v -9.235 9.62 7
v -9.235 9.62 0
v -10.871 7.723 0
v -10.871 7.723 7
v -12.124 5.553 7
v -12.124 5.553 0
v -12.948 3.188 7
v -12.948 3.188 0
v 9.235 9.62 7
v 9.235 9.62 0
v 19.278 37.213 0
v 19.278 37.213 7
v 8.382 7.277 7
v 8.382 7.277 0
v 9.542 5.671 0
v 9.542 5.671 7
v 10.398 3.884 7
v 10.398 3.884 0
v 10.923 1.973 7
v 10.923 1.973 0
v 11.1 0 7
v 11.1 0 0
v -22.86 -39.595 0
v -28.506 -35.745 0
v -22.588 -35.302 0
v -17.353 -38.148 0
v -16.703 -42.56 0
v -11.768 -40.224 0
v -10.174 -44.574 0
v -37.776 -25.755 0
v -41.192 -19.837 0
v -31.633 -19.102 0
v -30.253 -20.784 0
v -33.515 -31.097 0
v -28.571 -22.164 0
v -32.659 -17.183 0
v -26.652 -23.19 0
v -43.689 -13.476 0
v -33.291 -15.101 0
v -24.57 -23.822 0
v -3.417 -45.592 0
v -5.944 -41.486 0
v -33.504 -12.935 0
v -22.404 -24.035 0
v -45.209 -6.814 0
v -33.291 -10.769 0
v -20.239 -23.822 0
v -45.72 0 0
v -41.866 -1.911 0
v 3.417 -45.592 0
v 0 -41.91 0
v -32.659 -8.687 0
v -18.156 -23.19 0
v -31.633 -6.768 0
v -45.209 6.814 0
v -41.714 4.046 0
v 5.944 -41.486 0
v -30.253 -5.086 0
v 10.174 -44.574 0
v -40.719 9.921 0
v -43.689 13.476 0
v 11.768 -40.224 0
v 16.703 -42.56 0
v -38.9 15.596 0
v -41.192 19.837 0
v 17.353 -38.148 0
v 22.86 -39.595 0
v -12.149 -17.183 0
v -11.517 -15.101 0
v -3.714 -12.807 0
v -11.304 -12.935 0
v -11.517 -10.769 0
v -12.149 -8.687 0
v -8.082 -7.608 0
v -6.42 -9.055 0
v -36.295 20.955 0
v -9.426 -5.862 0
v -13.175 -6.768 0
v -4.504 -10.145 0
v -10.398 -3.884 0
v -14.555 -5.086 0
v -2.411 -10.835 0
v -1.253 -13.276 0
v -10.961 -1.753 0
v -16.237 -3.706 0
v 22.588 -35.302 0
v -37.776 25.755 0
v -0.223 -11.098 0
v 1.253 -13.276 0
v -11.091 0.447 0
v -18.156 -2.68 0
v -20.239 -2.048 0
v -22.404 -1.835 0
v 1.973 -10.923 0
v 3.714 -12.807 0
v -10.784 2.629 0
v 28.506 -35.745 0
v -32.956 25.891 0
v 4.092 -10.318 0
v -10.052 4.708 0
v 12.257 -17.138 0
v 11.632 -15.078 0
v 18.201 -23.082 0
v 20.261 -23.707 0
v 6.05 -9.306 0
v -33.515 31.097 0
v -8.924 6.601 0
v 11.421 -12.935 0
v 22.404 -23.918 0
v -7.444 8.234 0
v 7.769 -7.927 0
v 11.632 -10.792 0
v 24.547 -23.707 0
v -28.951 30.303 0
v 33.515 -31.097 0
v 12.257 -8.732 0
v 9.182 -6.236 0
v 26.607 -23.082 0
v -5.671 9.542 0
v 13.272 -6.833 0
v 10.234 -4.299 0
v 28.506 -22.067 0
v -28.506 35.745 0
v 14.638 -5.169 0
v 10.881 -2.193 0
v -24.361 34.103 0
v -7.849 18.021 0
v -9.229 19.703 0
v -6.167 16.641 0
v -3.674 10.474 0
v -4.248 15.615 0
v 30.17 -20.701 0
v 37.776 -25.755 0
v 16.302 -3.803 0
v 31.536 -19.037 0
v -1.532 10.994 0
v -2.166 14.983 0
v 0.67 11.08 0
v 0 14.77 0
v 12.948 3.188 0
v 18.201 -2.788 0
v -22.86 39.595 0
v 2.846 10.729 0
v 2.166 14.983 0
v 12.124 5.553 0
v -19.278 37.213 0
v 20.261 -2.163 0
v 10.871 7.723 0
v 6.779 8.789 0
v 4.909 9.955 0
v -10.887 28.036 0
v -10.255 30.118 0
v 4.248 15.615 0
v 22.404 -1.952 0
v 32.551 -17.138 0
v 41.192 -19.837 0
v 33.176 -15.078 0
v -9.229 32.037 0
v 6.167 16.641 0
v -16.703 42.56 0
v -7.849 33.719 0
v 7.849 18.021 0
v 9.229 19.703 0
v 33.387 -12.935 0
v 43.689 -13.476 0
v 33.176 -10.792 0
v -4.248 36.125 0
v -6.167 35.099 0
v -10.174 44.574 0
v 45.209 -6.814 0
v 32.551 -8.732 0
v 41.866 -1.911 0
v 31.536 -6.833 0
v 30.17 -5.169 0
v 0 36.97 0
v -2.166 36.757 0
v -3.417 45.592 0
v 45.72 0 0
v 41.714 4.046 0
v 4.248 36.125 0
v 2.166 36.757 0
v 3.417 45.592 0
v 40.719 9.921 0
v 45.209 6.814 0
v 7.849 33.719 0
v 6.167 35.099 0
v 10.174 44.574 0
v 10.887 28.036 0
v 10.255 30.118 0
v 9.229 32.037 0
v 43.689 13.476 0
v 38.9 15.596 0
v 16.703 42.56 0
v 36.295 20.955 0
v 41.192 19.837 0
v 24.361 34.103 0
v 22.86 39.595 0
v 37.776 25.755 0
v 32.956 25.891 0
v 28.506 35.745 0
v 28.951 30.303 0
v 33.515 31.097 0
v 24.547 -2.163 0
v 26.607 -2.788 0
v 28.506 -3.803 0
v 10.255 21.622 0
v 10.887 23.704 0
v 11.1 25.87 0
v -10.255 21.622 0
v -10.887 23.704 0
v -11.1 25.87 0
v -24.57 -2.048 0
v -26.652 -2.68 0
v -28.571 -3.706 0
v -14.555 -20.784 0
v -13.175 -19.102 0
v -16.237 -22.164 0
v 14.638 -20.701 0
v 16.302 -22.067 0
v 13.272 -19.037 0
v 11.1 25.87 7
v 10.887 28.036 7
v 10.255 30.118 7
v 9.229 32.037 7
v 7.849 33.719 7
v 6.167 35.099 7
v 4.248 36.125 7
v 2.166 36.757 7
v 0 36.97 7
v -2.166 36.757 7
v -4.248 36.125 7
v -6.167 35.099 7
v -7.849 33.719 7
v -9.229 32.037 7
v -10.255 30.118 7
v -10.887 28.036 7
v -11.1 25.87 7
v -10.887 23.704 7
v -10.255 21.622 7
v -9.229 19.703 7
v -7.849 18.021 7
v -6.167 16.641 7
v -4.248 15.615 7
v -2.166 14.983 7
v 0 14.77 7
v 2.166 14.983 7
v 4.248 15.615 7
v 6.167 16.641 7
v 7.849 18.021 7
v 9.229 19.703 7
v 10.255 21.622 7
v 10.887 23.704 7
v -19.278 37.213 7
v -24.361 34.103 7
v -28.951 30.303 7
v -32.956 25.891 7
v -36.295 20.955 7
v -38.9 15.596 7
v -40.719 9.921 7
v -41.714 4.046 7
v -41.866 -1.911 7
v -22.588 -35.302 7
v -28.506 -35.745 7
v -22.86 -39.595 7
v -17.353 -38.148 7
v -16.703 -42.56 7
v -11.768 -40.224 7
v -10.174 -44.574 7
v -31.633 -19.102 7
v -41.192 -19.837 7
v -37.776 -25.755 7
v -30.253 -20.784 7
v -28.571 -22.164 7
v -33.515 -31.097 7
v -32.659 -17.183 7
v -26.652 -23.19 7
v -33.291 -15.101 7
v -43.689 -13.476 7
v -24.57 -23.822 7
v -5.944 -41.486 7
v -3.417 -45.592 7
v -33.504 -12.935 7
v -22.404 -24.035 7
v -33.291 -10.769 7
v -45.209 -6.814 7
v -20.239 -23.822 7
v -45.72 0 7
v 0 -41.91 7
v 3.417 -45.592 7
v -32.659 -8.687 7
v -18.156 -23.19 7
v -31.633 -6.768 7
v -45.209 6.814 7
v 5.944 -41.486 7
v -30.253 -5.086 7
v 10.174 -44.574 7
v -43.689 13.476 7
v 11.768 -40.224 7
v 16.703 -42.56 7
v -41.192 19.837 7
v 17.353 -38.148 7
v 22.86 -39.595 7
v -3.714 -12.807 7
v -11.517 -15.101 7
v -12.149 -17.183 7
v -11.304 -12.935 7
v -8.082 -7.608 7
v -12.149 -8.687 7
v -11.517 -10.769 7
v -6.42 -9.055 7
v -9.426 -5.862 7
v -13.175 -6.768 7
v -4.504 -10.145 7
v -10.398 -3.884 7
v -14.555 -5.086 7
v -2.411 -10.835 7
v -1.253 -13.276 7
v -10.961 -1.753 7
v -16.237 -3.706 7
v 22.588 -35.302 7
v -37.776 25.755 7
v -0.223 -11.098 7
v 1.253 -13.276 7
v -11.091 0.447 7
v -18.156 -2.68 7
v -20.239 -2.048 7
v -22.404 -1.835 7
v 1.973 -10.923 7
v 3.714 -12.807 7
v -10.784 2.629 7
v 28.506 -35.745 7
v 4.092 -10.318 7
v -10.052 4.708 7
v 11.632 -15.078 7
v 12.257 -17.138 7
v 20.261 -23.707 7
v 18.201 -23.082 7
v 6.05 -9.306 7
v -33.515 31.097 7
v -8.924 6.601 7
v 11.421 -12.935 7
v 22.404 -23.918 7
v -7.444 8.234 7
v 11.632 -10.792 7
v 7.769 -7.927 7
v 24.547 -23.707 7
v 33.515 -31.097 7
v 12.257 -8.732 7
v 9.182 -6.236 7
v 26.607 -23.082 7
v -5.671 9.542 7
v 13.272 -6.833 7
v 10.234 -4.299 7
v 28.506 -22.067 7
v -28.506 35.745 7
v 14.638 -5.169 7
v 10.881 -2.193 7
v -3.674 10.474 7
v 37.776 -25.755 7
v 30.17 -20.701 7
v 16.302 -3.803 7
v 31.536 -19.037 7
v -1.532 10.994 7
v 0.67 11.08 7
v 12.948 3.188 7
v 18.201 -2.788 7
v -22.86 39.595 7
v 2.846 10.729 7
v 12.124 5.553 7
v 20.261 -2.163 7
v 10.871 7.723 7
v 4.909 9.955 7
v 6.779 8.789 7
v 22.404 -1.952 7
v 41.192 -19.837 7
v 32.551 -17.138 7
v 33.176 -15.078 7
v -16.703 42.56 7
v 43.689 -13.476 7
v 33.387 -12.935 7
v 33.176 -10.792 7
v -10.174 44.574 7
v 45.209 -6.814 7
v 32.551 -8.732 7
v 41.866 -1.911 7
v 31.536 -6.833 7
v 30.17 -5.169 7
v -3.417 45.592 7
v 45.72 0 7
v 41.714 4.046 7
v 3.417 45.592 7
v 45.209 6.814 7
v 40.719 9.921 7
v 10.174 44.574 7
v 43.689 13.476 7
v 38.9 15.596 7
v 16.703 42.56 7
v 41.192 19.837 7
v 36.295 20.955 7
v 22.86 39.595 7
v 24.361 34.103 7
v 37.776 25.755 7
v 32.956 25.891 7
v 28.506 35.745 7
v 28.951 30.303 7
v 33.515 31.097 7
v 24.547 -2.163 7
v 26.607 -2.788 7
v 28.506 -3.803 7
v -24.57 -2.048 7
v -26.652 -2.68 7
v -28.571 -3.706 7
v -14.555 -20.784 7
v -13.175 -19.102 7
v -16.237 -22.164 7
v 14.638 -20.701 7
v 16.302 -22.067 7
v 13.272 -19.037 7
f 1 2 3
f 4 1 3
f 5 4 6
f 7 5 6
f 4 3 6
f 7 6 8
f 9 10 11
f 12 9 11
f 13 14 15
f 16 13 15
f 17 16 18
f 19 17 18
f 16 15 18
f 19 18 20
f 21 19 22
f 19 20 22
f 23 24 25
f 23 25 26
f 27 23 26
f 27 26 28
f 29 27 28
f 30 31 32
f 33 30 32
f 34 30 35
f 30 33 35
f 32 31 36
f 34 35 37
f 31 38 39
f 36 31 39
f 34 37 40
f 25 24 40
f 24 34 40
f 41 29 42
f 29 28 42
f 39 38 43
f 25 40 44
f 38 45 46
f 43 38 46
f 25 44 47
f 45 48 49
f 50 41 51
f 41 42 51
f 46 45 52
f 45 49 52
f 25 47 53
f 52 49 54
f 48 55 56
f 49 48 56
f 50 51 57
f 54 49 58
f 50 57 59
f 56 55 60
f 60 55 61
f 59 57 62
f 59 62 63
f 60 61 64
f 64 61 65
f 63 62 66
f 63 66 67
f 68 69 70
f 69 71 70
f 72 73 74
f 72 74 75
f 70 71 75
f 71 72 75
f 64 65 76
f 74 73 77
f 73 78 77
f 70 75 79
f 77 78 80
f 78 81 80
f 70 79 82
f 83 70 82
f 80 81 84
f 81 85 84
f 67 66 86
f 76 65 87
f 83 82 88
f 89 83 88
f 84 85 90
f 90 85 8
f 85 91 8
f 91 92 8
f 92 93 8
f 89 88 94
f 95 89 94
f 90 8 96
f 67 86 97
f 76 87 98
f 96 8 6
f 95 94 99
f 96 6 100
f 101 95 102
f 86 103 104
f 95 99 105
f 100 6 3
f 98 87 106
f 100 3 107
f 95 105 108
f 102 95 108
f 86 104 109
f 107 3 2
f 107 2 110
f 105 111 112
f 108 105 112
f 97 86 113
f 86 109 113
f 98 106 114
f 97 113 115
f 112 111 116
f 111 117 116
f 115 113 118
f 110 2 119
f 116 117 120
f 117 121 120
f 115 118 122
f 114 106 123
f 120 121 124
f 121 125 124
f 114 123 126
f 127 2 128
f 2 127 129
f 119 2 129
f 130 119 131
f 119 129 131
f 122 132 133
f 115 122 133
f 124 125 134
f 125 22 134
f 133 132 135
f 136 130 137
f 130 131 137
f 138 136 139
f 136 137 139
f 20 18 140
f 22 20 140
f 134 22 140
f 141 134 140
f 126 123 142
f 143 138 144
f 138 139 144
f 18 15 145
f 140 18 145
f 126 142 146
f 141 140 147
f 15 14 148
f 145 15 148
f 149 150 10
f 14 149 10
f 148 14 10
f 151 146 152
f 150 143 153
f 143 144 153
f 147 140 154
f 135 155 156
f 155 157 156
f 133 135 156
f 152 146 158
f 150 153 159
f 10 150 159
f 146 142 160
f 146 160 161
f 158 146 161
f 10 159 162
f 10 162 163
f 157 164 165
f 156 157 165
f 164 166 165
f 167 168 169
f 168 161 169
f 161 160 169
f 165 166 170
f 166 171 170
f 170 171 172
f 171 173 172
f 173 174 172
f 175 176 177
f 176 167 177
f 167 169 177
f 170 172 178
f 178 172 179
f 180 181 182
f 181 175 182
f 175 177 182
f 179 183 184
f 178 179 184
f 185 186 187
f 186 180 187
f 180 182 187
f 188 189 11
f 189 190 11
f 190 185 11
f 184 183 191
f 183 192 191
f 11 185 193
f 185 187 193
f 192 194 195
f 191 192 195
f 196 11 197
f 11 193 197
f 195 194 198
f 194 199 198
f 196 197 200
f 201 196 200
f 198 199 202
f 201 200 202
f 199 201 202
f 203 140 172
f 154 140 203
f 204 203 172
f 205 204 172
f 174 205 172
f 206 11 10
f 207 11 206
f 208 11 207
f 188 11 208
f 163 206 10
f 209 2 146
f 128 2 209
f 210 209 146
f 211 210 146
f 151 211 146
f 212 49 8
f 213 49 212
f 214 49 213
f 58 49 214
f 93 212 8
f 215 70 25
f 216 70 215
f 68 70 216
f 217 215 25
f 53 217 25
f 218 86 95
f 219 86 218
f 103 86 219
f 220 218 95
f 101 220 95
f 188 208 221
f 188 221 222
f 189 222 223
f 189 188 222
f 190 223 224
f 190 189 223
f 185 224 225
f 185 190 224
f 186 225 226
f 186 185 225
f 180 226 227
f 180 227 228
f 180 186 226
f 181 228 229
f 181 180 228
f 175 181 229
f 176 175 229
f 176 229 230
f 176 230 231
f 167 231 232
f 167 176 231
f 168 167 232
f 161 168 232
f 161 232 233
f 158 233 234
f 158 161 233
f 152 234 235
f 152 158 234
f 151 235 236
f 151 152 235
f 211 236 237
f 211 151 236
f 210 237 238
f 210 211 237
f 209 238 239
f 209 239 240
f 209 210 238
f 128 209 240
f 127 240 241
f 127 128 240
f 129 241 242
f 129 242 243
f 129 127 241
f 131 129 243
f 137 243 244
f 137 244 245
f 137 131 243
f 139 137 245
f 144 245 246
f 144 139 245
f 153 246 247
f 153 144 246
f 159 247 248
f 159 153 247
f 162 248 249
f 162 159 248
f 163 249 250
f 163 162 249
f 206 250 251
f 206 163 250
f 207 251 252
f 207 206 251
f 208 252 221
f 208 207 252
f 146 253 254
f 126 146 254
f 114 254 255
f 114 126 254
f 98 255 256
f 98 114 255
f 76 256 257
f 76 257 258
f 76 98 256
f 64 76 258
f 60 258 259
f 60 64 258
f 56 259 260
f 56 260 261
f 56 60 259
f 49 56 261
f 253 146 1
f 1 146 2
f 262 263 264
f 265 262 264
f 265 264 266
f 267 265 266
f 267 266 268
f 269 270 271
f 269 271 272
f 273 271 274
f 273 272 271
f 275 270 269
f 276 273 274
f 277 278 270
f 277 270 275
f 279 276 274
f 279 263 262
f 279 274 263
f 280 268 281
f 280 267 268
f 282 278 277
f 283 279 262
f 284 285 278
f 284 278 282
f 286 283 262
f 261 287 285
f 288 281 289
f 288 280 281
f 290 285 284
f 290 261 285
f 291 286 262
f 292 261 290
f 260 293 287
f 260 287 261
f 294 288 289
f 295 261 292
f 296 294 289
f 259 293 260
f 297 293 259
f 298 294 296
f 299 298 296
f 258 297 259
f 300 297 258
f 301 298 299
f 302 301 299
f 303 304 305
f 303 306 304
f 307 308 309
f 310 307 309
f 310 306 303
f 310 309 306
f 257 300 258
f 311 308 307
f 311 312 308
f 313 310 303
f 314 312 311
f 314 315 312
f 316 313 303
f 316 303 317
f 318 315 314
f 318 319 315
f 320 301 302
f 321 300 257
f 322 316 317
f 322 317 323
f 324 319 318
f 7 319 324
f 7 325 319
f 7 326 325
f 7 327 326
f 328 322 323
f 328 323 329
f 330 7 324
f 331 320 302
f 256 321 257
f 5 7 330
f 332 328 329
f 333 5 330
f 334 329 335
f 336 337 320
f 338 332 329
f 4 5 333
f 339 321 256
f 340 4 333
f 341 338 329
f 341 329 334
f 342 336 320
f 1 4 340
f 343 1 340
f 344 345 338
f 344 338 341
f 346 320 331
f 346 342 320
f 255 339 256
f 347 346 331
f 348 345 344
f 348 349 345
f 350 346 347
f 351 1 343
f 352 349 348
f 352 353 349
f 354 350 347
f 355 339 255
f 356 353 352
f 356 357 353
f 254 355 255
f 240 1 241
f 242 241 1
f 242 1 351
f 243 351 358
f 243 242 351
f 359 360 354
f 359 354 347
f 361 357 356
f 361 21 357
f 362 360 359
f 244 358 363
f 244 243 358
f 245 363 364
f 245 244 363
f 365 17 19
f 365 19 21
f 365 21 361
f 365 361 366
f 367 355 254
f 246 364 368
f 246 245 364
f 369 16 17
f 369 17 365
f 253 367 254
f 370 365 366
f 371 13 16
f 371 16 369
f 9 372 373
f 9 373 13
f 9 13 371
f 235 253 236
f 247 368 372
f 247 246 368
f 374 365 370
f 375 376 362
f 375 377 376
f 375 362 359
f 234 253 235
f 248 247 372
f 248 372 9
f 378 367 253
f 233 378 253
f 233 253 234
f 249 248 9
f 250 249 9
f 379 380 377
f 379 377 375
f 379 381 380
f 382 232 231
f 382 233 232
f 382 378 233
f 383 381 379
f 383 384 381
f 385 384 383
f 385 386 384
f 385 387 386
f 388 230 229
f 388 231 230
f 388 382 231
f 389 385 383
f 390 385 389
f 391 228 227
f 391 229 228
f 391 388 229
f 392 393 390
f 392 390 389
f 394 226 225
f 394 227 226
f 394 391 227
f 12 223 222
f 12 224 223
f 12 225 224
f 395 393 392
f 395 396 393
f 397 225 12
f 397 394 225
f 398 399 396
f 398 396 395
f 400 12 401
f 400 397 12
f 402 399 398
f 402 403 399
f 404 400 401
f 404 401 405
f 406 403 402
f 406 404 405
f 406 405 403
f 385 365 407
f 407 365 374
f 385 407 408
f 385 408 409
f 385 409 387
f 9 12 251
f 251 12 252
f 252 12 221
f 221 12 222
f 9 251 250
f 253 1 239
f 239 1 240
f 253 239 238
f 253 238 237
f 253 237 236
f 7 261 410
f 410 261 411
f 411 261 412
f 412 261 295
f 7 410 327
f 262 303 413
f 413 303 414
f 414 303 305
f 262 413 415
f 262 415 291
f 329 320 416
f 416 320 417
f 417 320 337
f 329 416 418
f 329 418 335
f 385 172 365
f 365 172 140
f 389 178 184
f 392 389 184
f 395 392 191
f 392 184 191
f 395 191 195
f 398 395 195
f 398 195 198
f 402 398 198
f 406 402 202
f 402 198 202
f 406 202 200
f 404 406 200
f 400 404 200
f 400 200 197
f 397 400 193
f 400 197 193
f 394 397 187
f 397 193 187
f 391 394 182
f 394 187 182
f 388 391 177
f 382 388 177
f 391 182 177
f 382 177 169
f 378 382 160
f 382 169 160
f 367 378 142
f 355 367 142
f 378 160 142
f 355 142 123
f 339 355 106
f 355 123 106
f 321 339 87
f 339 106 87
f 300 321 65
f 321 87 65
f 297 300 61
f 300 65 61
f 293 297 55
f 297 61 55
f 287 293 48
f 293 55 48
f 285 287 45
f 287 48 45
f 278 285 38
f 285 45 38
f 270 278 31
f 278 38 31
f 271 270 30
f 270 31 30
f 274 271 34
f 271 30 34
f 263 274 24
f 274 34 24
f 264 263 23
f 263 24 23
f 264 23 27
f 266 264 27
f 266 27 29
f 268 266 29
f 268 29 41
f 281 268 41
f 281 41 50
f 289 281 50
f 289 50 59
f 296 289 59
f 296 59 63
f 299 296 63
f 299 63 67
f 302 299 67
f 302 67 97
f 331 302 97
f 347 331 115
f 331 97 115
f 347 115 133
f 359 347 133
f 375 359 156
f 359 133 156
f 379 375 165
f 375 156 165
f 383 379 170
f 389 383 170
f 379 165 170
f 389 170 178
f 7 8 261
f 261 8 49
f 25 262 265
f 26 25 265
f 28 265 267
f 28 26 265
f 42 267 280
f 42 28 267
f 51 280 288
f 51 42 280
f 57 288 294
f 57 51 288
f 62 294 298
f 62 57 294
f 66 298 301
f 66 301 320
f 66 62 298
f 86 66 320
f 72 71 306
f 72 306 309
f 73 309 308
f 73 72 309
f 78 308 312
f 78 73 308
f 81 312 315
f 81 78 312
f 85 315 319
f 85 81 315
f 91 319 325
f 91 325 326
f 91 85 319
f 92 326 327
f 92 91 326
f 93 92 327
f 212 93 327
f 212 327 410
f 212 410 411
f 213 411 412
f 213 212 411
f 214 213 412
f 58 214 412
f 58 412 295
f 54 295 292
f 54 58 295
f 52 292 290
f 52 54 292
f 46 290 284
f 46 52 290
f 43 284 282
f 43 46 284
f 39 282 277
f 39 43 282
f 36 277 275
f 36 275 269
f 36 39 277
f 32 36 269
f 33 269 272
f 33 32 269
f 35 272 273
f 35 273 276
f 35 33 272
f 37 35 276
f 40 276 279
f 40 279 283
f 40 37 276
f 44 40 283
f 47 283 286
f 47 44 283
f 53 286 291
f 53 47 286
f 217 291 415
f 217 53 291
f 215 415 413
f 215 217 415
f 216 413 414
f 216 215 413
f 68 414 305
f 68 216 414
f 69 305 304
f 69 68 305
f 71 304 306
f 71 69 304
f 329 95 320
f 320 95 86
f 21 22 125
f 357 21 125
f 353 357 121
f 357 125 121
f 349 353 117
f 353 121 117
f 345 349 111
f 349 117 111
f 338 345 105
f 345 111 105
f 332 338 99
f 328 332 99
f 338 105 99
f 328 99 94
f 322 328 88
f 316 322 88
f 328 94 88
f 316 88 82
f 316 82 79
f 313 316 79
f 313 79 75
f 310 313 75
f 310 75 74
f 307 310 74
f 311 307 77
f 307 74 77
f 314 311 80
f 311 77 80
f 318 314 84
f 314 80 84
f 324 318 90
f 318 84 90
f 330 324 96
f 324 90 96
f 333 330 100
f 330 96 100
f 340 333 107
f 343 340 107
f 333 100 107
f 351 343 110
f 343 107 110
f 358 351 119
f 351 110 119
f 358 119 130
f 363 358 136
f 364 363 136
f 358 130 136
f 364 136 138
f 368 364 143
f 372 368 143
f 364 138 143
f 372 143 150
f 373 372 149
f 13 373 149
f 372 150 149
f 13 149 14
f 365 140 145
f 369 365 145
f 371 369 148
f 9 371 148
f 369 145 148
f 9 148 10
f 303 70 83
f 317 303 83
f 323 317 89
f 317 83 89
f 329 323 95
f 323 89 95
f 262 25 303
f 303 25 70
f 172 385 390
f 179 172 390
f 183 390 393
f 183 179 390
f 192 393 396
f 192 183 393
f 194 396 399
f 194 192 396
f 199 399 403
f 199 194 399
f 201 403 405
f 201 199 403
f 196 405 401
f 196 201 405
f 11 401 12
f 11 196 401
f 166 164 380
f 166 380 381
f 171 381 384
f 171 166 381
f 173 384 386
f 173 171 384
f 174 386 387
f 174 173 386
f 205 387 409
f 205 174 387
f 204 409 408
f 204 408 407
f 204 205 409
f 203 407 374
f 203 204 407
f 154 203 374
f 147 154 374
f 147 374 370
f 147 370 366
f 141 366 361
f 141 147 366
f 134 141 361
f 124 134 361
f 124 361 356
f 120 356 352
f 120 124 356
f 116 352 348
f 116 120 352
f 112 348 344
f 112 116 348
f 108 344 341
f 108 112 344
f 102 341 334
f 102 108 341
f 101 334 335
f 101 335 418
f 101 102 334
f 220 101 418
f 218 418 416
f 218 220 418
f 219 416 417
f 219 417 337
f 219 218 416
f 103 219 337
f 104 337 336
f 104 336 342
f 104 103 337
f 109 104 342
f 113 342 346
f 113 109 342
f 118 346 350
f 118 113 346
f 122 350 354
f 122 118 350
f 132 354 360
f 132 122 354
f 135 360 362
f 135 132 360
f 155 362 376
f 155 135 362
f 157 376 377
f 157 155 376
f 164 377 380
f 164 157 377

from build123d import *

# Parameters (mm, degrees)
F0_R     = 11.1
F0_R_2   = 10.983308
F1_DEPTH = 7
F2_R     = 45.72
F2_R_2   = 41.91
F3_DEPTH = 7


with BuildPart() as f1:
    # F0 (on Top) → F1 (new body)
    with BuildSketch(Plane.XY):
        with BuildLine():
            ThreePointArc((12.948403, 3.187646), (11.548449, 6.6675), (9.234784, 9.619823))
            Line((9.234784, 9.619823), (19.675505, 38.305468))
            ThreePointArc((19.675505, 38.305468), (0, 43.586091), (-19.675505, 38.305468))
            Line((-19.675505, 38.305468), (-9.234784, 9.619823))
            ThreePointArc((-9.234784, 9.619823), (-11.548449, 6.6675), (-12.948403, 3.187646))
            Line((-12.948403, 3.187646), (-43.011261, -2.113247))
            ThreePointArc((-43.011261, -2.113247), (-37.746662, -21.793046), (-23.335756, -36.192221))
            Line((-23.335756, -36.192221), (-3.713619, -12.807469))
            ThreePointArc((-3.713619, -12.807469), (0, -13.335), (3.713619, -12.807469))
            Line((3.713619, -12.807469), (23.335756, -36.192221))
            ThreePointArc((23.335756, -36.192221), (37.746662, -21.793046), (43.011261, -2.113247))
            Line((43.011261, -2.113247), (12.948403, 3.187646))
        make_face()
        with Locations((-22.404077, -12.935)):
            Circle(F0_R, mode=Mode.SUBTRACT)
        with BuildLine():
            ThreePointArc((8.382, 7.276818), (10.398322, 3.883928), (11.1, 0))
            ThreePointArc((11.1, 0), (-10.398322, -3.883928), (8.382, 7.276818))
        make_face(mode=Mode.SUBTRACT)
        with Locations((22.404077, -12.935)):
            Circle(F0_R_2, mode=Mode.SUBTRACT)
        with Locations((0, 25.87)):
            Circle(F0_R, mode=Mode.SUBTRACT)
    extrude(amount=F1_DEPTH)

    # F2 (on Top) → F3 (join)
    with BuildSketch(Plane.XY):
        Circle(F2_R)
        Circle(F2_R_2, mode=Mode.SUBTRACT)
    extrude(amount=F3_DEPTH)


solid = f1.part
